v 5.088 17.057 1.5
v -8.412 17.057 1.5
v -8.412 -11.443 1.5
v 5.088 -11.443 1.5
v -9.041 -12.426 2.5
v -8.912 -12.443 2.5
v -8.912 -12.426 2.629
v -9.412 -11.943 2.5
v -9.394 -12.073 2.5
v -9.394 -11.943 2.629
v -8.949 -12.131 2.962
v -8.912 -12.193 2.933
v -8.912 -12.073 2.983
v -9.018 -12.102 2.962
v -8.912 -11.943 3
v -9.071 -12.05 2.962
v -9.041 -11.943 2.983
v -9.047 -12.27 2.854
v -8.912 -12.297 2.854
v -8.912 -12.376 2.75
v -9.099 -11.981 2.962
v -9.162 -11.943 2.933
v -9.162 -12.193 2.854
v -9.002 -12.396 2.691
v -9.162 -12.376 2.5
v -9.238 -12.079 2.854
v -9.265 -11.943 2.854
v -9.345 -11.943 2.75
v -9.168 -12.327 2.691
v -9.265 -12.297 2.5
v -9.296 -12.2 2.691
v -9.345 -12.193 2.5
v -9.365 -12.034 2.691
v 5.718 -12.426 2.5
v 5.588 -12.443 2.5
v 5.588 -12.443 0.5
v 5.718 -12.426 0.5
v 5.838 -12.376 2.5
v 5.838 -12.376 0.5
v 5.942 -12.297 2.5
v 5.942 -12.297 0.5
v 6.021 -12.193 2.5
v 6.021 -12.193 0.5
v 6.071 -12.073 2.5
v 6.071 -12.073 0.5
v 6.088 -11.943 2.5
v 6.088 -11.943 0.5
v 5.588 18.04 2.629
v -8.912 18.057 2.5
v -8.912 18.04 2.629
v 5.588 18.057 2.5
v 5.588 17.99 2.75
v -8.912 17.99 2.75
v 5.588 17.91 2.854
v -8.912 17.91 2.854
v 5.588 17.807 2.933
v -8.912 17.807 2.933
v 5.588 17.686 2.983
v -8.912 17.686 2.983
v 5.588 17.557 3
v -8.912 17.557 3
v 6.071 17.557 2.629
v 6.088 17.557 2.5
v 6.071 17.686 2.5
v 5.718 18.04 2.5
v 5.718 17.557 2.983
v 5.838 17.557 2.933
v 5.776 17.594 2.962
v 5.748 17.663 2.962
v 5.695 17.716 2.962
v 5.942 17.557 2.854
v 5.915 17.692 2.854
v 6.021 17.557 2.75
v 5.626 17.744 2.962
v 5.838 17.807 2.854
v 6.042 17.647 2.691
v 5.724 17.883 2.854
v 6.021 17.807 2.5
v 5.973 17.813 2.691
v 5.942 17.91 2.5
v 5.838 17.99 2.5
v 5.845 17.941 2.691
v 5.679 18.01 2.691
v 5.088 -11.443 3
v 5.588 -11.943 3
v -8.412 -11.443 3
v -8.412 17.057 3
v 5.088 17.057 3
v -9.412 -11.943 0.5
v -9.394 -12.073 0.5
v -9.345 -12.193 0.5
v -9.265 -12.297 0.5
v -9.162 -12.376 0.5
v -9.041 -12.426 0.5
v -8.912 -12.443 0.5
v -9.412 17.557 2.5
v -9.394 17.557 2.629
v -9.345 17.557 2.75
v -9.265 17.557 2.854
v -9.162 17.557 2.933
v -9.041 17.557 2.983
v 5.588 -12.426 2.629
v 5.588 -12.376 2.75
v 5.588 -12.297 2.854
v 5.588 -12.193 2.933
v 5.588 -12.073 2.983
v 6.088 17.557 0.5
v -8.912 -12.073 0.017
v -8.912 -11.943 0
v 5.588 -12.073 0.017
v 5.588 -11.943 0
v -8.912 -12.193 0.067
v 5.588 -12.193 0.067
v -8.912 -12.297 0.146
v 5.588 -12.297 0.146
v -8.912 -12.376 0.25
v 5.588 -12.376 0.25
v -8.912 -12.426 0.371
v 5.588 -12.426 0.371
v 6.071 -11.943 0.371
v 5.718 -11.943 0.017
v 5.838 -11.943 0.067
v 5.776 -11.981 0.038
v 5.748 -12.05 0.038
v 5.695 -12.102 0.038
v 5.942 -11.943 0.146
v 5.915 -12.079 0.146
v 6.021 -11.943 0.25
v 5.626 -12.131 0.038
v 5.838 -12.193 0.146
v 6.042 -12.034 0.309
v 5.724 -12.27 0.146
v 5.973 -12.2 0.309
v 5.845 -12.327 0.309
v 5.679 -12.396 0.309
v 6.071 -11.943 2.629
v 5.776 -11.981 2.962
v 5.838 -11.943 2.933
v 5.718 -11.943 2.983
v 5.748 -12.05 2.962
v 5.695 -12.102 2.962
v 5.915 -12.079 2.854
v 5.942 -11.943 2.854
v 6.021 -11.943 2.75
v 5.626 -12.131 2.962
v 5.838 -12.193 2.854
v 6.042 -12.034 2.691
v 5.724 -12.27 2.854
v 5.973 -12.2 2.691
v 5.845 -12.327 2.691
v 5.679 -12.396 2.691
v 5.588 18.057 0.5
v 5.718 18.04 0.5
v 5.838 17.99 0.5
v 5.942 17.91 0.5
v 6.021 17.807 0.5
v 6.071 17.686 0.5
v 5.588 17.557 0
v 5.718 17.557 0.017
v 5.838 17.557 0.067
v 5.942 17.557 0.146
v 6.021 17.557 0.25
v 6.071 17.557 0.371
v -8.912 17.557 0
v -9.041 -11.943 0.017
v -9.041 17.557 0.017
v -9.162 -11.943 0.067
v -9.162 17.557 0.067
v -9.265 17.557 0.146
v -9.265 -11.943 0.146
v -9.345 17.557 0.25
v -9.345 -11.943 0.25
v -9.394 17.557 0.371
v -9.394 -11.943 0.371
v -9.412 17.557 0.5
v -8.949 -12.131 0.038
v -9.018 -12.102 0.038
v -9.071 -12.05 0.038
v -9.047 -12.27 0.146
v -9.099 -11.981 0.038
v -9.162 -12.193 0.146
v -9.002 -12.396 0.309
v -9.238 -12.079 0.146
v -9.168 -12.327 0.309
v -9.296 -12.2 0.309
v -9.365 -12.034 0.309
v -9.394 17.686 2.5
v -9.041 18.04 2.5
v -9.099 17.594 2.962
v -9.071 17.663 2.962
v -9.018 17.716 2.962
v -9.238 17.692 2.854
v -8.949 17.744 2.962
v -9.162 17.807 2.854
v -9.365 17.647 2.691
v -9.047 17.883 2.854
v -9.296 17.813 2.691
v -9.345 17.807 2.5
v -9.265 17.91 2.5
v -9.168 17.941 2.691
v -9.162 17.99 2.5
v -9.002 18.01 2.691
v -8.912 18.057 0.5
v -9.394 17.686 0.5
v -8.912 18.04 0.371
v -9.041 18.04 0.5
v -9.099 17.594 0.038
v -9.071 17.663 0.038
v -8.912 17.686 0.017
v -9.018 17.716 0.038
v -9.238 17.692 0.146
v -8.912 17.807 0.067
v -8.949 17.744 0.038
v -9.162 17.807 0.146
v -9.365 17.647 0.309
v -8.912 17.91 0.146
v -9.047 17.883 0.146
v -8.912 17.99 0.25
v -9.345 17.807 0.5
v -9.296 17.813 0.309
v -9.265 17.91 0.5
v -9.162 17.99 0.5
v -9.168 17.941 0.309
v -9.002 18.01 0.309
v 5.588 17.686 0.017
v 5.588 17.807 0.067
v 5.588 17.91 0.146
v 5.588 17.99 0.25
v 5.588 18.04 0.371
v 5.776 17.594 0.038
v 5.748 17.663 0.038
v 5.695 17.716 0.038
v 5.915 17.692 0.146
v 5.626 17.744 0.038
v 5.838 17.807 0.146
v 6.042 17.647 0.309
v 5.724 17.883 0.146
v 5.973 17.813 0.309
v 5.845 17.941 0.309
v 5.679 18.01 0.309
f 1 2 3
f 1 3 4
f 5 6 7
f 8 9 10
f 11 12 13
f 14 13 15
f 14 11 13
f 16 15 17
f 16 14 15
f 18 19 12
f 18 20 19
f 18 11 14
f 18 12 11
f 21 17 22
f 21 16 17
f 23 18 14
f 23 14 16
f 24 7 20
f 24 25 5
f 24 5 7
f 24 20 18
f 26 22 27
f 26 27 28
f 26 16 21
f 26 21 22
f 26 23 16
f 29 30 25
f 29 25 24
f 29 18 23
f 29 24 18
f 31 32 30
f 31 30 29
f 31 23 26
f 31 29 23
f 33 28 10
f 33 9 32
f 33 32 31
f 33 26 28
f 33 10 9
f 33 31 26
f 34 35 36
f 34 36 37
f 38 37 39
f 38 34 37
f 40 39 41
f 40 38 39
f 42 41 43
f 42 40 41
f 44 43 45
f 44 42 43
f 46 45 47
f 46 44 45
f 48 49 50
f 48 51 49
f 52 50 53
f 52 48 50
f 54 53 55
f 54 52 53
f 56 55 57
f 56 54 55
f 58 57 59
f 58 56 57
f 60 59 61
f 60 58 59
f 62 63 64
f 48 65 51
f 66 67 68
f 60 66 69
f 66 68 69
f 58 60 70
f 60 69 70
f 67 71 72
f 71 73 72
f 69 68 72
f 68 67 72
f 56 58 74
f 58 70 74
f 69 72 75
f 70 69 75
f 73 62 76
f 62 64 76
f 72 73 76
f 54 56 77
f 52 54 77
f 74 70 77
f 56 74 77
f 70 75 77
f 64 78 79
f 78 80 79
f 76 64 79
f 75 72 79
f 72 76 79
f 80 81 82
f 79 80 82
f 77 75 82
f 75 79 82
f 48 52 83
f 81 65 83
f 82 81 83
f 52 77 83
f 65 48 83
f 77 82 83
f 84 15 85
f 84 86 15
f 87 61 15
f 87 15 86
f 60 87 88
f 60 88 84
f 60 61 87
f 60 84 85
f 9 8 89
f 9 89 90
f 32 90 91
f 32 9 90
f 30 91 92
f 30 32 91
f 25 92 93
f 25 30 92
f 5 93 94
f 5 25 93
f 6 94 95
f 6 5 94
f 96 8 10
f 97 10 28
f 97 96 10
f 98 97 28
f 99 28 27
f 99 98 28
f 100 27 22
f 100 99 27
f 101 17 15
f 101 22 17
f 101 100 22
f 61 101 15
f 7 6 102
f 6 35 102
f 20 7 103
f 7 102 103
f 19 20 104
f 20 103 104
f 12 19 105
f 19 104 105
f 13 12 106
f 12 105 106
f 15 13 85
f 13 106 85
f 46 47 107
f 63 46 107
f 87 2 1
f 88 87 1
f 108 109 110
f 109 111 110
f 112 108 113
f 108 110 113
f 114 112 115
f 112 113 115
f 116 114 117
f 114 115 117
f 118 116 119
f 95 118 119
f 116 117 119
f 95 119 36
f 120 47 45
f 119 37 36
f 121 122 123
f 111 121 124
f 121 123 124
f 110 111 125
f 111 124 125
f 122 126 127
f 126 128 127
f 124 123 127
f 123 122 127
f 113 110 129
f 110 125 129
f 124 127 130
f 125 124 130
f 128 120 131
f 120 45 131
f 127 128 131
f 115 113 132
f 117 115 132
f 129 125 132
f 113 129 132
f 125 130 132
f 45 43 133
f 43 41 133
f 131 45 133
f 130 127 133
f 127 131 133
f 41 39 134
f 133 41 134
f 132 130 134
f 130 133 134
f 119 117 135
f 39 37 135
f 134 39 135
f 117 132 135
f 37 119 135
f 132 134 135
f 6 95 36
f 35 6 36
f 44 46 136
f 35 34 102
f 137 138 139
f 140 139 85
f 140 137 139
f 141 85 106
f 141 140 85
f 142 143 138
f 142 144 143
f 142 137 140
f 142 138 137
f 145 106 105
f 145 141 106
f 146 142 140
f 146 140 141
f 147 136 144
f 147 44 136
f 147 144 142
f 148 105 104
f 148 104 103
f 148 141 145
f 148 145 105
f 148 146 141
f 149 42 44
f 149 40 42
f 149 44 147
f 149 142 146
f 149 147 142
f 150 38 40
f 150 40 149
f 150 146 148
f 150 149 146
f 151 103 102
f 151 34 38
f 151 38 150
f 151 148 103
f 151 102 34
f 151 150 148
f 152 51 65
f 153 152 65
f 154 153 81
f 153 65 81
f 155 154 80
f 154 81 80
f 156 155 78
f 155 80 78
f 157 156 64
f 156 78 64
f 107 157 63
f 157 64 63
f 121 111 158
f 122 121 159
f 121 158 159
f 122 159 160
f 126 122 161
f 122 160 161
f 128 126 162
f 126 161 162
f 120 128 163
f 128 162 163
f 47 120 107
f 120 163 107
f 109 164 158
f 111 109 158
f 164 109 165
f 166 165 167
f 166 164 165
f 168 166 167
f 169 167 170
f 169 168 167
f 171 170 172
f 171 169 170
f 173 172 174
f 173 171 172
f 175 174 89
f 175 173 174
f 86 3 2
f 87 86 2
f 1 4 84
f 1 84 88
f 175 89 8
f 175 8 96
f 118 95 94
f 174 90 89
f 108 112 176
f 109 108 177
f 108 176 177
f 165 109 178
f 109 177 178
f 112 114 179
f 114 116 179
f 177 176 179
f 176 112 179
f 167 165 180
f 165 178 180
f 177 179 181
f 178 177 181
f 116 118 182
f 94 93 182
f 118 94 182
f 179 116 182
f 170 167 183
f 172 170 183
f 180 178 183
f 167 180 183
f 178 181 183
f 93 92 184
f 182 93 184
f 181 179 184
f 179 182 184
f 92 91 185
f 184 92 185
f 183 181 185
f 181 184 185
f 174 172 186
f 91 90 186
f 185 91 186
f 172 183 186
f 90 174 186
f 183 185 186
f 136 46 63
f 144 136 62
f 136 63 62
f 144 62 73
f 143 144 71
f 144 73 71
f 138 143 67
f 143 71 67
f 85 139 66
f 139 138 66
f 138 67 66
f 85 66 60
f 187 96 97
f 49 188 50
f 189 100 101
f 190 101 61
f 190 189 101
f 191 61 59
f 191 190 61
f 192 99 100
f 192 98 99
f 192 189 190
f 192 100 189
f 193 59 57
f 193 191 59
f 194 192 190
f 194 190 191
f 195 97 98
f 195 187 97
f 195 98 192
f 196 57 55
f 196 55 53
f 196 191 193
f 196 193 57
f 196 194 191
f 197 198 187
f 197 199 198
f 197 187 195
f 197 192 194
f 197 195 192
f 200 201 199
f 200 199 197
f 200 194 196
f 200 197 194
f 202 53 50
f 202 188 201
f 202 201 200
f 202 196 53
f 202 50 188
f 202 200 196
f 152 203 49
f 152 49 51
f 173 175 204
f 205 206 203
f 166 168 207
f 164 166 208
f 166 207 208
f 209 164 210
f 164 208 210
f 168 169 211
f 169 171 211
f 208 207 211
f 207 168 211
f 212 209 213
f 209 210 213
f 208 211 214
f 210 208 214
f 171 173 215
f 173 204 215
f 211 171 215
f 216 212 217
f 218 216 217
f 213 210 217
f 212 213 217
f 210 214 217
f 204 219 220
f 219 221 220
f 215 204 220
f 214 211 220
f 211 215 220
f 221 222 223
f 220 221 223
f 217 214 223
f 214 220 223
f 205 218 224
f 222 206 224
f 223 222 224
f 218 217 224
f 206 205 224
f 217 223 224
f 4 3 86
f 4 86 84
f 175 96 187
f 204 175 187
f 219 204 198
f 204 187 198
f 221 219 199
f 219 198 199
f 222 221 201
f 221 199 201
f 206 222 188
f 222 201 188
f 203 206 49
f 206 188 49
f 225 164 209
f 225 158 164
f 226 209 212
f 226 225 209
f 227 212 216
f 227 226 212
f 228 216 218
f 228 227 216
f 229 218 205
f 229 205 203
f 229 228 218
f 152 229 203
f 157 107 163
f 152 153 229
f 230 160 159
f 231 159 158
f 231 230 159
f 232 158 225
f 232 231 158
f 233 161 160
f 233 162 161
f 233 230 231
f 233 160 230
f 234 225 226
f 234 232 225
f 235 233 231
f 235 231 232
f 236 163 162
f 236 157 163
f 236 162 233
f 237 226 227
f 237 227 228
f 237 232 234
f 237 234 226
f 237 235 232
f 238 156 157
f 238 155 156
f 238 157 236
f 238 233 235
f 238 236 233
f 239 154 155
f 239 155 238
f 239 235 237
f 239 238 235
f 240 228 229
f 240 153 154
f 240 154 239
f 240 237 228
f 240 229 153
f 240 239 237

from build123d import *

# Parameters (mm, degrees)
F0_W     = 15.5
F0_H     = 30.5
F0_W_2   = 13.5
F0_H_2   = 28.5
F1_DEPTH = 3
F2_DEPTH = 1.5
F3_R     = 0.5


with BuildPart() as f1:
    # F0 (on Top) → F1 (new body)
    with BuildSketch(Plane.XY):
        with Locations((-1.661532, 2.806597)):
            Rectangle(F0_W, F0_H)
        with Locations((-1.661532, 2.806597)):
            Rectangle(F0_W_2, F0_H_2, mode=Mode.SUBTRACT)
    extrude(amount=F1_DEPTH)

    # F0 (on Top) → F2 (join)
    with BuildSketch(Plane.XY):
        with Locations((-1.661532, 2.806597)):
            Rectangle(F0_W_2, F0_H_2)
    extrude(amount=F2_DEPTH)

    # F3
    f3_edges = [f1.edges().sort_by_distance(p)[0] for p in [
        (6.088468, -12.443403, 1.5),
        (6.088468, 18.056597, 1.5),
        (6.088468, 2.806597, 0),
        (6.088468, 2.806597, 3),
        (-9.411532, -12.443403, 1.5),
        (-1.661532, -12.443403, 0),
        (-1.661532, -12.443403, 3),
        (-9.411532, 18.056597, 1.5),
        (-9.411532, 2.806597, 0),
        (-9.411532, 2.806597, 3),
        (-1.661532, 18.056597, 0),
        (-1.661532, 18.056597, 3),
    ]]
    fillet(f3_edges, radius=F3_R)


solid = f1.part
